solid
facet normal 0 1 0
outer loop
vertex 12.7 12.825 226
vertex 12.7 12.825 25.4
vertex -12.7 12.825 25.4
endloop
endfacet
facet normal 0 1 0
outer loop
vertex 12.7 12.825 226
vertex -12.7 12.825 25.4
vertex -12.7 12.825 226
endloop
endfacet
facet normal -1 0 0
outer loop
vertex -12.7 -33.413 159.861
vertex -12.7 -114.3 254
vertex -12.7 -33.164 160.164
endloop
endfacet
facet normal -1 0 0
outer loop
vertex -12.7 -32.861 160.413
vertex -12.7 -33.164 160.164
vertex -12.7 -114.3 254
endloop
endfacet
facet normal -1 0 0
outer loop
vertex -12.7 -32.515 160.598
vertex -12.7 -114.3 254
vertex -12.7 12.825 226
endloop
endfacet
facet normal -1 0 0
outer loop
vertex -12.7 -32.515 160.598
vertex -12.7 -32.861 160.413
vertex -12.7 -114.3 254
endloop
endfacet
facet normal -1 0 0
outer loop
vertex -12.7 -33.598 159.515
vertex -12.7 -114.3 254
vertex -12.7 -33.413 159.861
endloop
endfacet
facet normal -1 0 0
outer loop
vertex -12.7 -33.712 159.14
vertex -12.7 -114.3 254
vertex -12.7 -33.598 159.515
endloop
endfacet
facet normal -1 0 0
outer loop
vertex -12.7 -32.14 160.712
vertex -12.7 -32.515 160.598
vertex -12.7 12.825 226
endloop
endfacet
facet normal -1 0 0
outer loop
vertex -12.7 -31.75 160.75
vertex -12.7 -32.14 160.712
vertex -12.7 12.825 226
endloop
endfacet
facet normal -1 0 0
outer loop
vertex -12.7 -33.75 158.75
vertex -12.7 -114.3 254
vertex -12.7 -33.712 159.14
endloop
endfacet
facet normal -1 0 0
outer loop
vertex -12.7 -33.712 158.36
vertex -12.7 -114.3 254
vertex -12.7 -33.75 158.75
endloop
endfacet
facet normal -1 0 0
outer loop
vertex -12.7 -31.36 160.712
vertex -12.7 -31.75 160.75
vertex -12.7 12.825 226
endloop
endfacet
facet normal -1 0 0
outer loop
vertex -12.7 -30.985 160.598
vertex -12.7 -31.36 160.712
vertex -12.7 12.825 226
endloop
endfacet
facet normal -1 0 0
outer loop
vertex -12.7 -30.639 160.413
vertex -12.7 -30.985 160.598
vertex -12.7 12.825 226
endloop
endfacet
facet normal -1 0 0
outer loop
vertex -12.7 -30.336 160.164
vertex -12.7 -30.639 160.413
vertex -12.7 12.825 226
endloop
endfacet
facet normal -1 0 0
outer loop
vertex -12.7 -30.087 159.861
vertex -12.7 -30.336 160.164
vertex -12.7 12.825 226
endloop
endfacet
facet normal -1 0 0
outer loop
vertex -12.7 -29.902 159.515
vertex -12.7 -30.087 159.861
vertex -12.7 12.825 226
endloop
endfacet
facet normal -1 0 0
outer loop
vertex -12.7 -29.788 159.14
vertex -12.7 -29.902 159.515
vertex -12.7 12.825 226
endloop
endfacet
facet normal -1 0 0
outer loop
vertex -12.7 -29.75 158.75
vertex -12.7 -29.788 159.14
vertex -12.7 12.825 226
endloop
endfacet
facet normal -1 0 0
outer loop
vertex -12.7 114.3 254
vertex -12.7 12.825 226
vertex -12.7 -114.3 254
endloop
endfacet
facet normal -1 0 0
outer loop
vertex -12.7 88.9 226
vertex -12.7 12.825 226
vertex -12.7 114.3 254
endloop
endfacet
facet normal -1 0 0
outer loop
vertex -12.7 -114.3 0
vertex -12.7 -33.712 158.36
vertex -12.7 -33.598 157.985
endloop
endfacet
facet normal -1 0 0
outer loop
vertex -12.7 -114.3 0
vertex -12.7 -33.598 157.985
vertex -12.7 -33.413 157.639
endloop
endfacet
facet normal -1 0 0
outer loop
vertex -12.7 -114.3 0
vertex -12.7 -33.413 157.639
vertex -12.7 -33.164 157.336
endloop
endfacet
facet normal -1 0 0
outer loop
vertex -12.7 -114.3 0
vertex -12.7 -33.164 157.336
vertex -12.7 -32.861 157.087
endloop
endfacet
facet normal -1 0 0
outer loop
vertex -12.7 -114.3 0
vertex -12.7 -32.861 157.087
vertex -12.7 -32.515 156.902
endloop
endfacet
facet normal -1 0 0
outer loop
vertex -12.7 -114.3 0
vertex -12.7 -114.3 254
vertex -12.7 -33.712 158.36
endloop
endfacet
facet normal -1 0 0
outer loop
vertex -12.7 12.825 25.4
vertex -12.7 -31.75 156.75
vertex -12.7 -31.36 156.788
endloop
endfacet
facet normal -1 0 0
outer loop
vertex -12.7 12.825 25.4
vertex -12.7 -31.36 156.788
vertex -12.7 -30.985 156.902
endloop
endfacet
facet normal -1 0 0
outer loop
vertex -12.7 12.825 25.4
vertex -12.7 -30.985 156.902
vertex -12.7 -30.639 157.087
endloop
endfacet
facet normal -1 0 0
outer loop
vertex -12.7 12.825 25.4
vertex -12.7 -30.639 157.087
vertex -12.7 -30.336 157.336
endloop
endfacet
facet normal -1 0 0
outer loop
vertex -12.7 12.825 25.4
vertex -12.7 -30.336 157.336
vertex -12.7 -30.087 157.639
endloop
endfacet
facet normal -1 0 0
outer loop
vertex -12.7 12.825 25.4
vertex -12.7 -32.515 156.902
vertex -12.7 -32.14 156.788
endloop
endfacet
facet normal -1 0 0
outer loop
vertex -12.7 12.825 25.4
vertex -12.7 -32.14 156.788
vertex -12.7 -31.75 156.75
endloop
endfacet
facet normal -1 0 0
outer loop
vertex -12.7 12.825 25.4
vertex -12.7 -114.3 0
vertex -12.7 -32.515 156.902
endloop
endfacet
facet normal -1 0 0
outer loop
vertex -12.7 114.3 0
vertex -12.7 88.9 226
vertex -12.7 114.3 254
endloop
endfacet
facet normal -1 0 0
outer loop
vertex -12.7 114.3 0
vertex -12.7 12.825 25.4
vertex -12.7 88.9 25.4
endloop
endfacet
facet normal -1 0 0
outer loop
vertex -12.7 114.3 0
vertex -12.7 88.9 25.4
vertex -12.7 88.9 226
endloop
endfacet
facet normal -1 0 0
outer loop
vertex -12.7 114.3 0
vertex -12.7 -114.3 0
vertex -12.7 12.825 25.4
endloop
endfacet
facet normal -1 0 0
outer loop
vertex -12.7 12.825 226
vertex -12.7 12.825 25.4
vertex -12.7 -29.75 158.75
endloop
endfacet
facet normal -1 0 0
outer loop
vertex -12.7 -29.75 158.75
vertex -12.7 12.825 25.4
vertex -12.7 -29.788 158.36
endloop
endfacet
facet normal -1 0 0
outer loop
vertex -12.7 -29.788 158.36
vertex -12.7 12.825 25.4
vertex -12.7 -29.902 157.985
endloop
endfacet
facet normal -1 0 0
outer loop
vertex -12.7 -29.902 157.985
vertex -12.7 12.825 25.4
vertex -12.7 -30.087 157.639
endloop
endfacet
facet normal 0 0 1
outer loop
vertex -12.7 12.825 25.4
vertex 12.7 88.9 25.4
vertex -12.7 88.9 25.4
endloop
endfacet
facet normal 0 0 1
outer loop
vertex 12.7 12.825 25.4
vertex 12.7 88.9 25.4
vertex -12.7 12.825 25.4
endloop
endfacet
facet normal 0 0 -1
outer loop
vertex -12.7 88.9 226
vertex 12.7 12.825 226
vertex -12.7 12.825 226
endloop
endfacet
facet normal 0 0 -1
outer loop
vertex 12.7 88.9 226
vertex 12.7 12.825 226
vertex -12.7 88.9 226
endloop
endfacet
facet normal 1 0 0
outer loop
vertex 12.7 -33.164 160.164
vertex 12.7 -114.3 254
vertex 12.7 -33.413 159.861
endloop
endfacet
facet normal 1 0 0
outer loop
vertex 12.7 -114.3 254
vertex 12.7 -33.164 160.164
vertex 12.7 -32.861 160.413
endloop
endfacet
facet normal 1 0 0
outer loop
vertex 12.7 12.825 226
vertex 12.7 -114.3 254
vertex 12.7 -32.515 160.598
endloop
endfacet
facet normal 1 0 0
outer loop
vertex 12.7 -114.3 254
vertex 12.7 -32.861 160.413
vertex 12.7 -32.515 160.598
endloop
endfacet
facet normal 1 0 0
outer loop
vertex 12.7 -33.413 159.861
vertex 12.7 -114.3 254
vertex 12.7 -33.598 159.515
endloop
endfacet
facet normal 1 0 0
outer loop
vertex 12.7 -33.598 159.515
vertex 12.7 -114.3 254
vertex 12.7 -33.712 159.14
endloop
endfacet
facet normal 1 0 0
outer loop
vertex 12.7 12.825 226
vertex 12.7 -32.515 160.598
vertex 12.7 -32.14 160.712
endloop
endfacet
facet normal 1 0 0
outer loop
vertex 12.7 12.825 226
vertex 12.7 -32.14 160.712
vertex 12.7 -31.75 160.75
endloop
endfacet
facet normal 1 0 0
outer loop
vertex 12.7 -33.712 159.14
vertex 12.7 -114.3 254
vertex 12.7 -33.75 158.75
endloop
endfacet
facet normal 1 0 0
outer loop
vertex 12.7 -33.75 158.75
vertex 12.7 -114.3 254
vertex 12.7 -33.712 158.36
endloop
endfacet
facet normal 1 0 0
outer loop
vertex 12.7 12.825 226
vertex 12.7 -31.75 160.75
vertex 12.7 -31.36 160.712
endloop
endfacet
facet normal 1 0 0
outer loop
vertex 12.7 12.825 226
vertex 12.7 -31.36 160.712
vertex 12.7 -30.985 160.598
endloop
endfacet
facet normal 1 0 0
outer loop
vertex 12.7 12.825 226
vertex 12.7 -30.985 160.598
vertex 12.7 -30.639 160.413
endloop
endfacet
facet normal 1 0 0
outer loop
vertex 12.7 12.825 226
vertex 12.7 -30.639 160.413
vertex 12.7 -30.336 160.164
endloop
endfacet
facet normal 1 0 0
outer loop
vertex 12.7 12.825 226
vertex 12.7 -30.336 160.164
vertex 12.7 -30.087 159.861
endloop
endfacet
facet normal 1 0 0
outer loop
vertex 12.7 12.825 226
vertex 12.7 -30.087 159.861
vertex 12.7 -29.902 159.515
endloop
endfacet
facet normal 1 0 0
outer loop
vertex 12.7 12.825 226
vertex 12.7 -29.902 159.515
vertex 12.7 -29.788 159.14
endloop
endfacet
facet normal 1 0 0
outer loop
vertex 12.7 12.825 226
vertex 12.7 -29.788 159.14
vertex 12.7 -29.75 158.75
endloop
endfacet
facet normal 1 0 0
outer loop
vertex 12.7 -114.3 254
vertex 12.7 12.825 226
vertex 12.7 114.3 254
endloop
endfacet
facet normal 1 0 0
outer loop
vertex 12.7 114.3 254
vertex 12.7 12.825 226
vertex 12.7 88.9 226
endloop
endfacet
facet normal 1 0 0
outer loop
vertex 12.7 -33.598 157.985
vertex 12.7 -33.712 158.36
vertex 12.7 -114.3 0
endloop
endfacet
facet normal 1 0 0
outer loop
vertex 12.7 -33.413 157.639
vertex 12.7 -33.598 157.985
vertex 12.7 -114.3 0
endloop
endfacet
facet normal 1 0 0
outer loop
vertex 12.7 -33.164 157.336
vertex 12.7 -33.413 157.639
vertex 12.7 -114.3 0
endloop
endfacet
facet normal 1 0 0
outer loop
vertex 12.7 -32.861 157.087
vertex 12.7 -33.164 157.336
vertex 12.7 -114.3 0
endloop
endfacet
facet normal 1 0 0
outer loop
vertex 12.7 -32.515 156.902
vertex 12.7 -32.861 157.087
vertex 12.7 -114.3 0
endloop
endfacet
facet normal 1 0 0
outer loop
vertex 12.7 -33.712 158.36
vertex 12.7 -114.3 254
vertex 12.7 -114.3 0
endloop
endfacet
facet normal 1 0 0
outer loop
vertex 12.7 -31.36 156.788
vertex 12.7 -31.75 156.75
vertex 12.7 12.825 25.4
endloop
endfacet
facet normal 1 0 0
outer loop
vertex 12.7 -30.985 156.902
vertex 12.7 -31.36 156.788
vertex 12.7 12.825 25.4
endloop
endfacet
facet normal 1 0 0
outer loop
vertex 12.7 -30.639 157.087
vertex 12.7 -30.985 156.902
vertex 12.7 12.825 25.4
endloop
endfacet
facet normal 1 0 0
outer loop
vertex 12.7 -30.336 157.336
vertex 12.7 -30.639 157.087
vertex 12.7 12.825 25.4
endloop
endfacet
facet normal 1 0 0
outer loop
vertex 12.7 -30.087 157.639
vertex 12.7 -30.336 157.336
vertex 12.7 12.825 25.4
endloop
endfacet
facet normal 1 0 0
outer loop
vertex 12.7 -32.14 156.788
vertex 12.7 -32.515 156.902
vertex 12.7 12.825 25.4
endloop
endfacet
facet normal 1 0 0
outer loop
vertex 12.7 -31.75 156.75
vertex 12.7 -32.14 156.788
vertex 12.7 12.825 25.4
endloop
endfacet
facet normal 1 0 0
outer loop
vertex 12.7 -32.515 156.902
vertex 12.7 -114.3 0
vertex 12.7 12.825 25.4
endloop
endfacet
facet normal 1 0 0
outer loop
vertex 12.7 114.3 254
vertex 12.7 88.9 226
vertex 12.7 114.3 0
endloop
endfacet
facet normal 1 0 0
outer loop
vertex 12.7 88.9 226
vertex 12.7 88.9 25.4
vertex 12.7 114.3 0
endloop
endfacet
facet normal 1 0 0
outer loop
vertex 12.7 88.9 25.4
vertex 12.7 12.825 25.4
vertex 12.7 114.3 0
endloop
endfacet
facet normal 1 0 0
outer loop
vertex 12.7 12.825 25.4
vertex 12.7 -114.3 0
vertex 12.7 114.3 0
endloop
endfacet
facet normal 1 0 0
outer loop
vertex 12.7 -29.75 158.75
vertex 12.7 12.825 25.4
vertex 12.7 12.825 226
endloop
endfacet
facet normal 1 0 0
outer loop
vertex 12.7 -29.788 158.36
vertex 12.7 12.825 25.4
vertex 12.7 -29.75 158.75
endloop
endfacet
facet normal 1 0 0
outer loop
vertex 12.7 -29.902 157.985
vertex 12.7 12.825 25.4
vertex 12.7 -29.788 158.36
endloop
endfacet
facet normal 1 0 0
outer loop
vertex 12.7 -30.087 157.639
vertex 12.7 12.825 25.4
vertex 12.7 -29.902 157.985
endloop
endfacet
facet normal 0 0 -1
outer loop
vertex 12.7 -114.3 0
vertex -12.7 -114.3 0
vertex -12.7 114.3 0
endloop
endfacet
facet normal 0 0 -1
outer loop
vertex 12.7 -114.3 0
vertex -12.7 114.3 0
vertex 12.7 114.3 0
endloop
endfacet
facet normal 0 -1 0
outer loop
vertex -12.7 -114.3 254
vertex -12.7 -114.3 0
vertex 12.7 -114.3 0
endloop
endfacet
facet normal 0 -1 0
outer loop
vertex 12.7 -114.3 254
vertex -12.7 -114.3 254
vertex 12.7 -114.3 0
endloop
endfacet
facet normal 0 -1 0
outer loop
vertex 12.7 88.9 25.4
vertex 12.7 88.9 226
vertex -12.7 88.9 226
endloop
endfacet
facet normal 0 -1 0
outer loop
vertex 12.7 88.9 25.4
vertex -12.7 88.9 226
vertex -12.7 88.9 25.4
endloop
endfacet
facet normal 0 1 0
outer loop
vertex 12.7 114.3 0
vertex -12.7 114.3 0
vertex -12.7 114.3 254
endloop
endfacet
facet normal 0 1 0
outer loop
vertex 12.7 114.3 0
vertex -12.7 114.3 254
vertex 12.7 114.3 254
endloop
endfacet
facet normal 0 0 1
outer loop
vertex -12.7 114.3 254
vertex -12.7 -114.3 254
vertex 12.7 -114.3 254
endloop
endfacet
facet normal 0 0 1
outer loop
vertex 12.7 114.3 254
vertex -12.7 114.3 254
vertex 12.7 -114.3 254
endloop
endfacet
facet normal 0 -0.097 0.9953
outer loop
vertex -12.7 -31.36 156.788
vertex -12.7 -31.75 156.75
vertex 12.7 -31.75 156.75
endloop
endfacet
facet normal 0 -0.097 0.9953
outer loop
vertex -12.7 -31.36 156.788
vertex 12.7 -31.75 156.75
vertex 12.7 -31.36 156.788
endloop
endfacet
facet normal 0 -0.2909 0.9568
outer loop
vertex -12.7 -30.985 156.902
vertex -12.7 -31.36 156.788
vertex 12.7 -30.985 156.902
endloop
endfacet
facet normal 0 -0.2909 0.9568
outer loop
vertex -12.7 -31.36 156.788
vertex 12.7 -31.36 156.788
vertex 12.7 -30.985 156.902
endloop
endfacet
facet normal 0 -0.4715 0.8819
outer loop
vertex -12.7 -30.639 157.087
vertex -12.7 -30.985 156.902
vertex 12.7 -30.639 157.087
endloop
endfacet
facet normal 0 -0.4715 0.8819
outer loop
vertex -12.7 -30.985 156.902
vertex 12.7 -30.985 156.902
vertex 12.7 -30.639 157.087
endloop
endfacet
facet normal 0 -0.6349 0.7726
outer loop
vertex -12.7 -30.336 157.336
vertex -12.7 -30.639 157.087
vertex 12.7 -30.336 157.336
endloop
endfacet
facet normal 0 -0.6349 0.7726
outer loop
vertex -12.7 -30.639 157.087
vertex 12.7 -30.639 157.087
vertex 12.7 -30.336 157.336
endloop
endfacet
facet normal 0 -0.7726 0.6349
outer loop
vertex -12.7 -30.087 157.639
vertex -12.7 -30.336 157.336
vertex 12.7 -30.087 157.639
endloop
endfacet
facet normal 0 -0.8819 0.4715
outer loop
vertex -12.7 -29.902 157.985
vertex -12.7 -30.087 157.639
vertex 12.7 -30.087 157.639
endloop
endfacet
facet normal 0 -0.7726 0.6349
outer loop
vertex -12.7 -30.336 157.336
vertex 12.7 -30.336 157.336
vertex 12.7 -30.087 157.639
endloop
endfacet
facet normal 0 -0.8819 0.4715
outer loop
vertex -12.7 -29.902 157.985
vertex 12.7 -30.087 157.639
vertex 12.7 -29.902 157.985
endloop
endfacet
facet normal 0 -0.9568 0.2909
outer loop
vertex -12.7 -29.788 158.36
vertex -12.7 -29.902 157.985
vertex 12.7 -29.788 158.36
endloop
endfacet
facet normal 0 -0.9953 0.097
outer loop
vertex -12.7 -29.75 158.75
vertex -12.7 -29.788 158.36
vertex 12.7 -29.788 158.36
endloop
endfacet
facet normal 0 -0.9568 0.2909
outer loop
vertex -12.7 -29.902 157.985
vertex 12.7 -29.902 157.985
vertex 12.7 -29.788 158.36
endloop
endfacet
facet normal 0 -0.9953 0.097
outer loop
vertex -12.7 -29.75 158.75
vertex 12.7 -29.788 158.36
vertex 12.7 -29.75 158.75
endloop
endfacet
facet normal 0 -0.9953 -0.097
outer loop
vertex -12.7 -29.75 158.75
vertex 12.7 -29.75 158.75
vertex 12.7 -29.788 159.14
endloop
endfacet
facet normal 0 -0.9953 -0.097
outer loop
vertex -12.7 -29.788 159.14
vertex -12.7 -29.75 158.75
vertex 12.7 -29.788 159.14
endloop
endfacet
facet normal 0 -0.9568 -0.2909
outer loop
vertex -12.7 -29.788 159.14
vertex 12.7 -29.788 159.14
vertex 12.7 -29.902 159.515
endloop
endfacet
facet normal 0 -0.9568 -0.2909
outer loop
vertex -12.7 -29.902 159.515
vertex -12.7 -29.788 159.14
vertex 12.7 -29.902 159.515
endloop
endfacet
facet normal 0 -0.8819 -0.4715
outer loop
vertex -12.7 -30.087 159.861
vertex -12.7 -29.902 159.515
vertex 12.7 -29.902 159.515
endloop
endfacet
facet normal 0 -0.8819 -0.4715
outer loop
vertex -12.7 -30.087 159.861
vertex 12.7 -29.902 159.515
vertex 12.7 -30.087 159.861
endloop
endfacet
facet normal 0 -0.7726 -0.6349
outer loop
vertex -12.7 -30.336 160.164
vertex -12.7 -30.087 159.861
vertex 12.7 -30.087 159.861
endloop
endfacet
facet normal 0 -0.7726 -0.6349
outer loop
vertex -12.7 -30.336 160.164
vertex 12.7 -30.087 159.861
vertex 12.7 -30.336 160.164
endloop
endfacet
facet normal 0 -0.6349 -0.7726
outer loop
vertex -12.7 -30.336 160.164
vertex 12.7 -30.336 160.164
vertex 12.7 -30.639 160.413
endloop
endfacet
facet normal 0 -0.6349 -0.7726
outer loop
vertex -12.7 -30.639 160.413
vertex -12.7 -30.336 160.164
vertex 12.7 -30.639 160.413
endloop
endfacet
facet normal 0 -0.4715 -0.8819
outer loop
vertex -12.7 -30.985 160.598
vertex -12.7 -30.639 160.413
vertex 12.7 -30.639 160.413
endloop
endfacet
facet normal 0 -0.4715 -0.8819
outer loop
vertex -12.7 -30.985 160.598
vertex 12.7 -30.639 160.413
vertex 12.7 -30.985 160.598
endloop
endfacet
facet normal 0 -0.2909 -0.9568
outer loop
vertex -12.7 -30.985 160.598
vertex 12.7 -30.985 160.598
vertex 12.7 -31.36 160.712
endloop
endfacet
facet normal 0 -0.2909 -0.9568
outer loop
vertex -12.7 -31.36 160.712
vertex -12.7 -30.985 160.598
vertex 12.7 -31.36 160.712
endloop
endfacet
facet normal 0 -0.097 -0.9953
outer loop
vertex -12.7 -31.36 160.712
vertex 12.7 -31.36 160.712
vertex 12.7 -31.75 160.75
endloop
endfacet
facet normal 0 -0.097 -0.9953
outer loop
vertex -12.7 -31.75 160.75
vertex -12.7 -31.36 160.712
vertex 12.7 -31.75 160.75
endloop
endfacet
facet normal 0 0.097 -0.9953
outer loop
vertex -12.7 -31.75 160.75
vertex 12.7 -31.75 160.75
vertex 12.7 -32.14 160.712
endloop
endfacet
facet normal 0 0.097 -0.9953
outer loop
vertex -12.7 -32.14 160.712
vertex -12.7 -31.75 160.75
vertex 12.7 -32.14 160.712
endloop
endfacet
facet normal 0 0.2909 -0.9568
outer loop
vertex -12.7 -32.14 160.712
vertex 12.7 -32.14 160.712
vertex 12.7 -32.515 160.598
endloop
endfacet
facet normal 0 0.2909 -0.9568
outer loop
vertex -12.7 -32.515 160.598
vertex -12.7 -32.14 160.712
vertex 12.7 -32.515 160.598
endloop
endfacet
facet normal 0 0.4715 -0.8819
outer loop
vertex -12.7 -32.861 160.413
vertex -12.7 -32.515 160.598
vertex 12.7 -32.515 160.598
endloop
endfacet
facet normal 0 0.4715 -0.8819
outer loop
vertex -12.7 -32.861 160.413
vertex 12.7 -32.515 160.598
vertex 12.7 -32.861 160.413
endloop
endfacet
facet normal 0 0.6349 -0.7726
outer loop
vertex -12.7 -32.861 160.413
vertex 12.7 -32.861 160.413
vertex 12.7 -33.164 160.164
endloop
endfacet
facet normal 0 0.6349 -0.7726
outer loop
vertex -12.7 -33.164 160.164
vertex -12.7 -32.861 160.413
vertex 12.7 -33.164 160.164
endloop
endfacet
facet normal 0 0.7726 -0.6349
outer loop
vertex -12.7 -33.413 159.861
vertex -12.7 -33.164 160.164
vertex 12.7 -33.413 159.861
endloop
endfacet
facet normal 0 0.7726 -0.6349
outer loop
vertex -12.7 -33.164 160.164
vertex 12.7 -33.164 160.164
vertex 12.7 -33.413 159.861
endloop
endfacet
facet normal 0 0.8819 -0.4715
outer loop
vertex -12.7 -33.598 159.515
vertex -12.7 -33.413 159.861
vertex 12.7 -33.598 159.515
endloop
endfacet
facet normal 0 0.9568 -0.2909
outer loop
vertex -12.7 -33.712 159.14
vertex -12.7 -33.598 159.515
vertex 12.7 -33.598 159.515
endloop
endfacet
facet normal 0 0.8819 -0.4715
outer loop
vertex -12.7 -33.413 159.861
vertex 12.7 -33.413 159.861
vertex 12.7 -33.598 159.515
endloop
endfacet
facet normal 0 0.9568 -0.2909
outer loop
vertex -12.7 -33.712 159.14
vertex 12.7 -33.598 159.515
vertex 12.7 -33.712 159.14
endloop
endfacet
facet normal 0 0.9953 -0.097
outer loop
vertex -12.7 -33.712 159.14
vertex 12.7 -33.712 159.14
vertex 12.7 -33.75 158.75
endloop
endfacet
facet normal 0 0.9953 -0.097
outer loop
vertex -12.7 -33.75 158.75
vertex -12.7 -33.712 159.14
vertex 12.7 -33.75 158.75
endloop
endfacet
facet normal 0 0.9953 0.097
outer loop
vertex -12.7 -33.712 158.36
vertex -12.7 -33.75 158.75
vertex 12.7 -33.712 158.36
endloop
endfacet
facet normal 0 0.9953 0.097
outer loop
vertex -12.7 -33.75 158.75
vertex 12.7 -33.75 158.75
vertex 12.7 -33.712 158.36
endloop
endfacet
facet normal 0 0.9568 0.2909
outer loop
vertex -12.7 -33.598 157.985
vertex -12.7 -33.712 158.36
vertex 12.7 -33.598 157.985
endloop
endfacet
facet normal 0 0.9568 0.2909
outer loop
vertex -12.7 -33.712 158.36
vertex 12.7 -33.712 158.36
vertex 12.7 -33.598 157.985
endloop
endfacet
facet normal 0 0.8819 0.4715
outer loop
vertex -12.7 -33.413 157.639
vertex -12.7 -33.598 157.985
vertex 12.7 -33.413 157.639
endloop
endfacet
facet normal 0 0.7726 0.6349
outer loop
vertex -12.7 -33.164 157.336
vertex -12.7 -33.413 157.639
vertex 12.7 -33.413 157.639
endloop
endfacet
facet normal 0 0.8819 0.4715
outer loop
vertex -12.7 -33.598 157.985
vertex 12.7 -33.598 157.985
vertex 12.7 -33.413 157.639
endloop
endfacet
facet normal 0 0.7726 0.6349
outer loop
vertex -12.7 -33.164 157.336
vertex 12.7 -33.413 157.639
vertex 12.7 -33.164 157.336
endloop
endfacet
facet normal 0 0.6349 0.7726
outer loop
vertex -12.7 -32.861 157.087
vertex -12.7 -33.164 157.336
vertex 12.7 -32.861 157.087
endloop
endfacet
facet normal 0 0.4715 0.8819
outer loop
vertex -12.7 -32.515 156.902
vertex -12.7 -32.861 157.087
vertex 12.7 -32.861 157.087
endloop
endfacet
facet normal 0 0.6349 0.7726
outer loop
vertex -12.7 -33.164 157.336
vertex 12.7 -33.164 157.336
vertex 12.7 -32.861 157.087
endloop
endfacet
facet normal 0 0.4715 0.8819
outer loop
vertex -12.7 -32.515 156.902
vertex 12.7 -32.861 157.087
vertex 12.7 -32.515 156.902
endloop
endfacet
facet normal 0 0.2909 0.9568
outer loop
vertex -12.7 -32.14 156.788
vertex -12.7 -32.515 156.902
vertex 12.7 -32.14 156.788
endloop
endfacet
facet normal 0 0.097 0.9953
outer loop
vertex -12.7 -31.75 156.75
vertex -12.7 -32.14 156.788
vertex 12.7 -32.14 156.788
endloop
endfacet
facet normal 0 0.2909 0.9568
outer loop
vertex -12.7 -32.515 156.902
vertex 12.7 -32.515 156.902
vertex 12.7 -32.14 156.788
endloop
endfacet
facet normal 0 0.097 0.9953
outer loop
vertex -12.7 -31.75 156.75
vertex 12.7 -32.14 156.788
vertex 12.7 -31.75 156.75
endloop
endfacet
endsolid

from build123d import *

# Parameters (mm, degrees)
SKETCH4_W           = 25.4
SKETCH4_H           = 228.6
BOSS_EXTRUDE1_DEPTH = 254
CUT_EXTRUDE3_DEPTH  = 280.688487428
SKETCH12_R          = 2
CUT_EXTRUDE4_DEPTH  = 280.688487428


with BuildPart() as part:
    # Sketch4 → Boss-Extrude1 (new body)
    with BuildSketch(Plane.XY):
        Rectangle(SKETCH4_W, SKETCH4_H)
    extrude(amount=BOSS_EXTRUDE1_DEPTH)

    # Sketch11 → Cut-Extrude3 (cut, through all)
    with BuildSketch(Plane(origin=(12.7, 0, 0), x_dir=(0, 0, -1), z_dir=(1, 0, 0))):
        Polygon((-226.0000001, 88.9), (-25.4000001, 88.9), (-25.4, 12.825), (-226.0000001, 12.825), align=None)
    extrude(amount=-CUT_EXTRUDE3_DEPTH, mode=Mode.SUBTRACT)

    # Sketch12 → Cut-Extrude4 (cut, through all)
    with BuildSketch(Plane(origin=(12.7, 0, 0), x_dir=(0, 0, -1), z_dir=(1, 0, 0))):
        with Locations((-158.75, -31.75)):
            Circle(SKETCH12_R)
    extrude(amount=-CUT_EXTRUDE4_DEPTH, mode=Mode.SUBTRACT)


solid = part.part
